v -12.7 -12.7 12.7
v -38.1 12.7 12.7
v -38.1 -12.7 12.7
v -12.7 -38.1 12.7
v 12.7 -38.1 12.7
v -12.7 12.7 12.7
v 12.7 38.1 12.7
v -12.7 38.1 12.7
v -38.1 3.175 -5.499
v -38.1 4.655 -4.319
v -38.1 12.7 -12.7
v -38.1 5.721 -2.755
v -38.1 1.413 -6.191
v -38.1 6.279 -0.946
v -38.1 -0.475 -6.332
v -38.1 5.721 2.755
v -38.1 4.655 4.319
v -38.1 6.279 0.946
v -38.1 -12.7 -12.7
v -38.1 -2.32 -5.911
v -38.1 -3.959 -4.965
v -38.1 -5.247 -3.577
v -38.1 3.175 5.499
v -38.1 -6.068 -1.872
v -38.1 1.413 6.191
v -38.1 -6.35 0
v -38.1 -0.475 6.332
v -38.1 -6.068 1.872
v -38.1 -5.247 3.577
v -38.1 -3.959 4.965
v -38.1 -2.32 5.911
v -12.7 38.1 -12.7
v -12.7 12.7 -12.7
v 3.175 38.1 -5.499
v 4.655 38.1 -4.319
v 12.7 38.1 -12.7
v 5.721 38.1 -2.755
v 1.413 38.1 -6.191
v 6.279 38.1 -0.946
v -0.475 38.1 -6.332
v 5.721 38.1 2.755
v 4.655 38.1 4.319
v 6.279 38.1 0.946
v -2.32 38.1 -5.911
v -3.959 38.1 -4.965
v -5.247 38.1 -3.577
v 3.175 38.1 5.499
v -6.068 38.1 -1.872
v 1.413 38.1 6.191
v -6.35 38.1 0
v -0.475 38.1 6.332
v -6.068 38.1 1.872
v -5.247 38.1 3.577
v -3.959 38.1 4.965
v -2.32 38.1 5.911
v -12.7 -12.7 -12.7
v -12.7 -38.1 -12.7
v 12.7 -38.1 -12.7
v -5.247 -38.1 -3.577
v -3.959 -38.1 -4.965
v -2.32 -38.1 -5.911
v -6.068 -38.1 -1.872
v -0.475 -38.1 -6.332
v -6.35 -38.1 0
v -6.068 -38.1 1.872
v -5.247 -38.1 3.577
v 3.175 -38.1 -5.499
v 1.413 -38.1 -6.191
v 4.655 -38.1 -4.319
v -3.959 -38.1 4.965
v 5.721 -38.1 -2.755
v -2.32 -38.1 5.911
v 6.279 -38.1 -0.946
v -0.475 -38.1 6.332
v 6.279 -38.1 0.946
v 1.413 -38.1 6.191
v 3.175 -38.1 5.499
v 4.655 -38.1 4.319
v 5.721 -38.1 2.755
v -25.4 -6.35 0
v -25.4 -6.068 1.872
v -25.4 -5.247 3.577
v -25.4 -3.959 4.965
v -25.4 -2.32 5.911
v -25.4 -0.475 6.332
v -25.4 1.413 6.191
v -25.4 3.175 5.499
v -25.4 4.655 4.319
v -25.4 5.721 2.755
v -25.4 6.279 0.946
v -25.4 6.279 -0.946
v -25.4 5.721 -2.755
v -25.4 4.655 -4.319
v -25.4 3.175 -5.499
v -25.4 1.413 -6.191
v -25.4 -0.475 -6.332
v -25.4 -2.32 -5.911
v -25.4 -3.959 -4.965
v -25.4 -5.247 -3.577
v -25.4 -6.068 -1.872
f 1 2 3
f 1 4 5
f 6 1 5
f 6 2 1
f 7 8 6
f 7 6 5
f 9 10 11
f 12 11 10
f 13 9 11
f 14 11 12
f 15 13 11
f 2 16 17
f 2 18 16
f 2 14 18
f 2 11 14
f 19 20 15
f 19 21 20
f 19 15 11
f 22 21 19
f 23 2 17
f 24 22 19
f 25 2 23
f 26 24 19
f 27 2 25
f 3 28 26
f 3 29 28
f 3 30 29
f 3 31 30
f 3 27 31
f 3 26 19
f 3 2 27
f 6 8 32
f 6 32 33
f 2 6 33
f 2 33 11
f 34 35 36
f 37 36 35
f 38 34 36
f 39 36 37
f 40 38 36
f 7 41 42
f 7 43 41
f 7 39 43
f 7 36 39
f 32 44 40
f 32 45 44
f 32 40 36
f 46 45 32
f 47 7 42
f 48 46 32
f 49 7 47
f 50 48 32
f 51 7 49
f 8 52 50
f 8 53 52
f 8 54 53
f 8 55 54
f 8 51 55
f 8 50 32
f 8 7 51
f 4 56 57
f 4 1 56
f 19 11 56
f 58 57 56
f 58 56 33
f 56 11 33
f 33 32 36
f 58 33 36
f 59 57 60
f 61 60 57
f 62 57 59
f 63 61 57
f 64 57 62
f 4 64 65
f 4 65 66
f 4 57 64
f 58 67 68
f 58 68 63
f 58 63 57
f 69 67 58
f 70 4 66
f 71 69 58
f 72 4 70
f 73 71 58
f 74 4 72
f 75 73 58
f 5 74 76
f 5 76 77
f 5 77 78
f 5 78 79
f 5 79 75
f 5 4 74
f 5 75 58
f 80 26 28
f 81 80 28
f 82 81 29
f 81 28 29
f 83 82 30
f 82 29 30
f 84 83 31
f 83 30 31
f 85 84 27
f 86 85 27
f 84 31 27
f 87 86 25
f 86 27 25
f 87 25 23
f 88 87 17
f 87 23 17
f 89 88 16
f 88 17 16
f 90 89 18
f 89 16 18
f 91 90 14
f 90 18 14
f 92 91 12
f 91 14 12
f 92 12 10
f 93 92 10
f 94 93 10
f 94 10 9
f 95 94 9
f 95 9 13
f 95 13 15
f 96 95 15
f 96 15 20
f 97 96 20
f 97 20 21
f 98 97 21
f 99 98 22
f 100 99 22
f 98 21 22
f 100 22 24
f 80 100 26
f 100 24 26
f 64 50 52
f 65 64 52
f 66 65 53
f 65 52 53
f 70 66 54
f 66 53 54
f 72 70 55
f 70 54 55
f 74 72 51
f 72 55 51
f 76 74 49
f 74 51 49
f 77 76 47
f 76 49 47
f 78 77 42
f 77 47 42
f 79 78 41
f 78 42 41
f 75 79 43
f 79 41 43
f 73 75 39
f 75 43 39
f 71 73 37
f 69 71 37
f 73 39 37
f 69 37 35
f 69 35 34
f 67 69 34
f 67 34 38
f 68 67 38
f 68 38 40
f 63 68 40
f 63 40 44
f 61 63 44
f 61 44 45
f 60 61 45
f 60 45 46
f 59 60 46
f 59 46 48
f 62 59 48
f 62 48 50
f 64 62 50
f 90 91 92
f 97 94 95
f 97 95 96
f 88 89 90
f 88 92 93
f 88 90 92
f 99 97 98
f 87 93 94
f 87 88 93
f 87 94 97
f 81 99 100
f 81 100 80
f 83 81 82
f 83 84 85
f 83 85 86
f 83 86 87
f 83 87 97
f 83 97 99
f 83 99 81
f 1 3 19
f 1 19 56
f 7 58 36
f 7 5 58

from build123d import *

# Parameters (mm, degrees)
F1_DEPTH = 12.7
F2_R     = 6.35
F3_DEPTH = 76.201
F4_R     = 6.35
F5_DEPTH = 12.7


with BuildPart() as f1:
    # F0 (on Top) → F1 (new body, symmetric)
    with BuildSketch(Plane.XY):
        Polygon((12.7, -38.1), (12.7, 0), (12.7, 38.1), (-12.7, 38.1), (-12.7, 12.7), (-38.1, 12.7), (-38.1, 0), (-38.1, -12.7), (-12.7, -12.7), (-12.7, -38.1), align=None)
    extrude(amount=F1_DEPTH, both=True)

    # F2 (on face) → F3 (cut, through all)
    with BuildSketch(Plane(origin=(0, 38.1, 0), x_dir=(-1, 0, 0), z_dir=(0, 1, 0))):
        Circle(F2_R)
    extrude(amount=-F3_DEPTH, mode=Mode.SUBTRACT)

    # F4 (on face) → F5 (cut)
    with BuildSketch(Plane(origin=(-38.1, 0, 0), x_dir=(0, -1, 0), z_dir=(-1, 0, 0))):
        Circle(F4_R)
    extrude(amount=-F5_DEPTH, mode=Mode.SUBTRACT)


solid = f1.part
